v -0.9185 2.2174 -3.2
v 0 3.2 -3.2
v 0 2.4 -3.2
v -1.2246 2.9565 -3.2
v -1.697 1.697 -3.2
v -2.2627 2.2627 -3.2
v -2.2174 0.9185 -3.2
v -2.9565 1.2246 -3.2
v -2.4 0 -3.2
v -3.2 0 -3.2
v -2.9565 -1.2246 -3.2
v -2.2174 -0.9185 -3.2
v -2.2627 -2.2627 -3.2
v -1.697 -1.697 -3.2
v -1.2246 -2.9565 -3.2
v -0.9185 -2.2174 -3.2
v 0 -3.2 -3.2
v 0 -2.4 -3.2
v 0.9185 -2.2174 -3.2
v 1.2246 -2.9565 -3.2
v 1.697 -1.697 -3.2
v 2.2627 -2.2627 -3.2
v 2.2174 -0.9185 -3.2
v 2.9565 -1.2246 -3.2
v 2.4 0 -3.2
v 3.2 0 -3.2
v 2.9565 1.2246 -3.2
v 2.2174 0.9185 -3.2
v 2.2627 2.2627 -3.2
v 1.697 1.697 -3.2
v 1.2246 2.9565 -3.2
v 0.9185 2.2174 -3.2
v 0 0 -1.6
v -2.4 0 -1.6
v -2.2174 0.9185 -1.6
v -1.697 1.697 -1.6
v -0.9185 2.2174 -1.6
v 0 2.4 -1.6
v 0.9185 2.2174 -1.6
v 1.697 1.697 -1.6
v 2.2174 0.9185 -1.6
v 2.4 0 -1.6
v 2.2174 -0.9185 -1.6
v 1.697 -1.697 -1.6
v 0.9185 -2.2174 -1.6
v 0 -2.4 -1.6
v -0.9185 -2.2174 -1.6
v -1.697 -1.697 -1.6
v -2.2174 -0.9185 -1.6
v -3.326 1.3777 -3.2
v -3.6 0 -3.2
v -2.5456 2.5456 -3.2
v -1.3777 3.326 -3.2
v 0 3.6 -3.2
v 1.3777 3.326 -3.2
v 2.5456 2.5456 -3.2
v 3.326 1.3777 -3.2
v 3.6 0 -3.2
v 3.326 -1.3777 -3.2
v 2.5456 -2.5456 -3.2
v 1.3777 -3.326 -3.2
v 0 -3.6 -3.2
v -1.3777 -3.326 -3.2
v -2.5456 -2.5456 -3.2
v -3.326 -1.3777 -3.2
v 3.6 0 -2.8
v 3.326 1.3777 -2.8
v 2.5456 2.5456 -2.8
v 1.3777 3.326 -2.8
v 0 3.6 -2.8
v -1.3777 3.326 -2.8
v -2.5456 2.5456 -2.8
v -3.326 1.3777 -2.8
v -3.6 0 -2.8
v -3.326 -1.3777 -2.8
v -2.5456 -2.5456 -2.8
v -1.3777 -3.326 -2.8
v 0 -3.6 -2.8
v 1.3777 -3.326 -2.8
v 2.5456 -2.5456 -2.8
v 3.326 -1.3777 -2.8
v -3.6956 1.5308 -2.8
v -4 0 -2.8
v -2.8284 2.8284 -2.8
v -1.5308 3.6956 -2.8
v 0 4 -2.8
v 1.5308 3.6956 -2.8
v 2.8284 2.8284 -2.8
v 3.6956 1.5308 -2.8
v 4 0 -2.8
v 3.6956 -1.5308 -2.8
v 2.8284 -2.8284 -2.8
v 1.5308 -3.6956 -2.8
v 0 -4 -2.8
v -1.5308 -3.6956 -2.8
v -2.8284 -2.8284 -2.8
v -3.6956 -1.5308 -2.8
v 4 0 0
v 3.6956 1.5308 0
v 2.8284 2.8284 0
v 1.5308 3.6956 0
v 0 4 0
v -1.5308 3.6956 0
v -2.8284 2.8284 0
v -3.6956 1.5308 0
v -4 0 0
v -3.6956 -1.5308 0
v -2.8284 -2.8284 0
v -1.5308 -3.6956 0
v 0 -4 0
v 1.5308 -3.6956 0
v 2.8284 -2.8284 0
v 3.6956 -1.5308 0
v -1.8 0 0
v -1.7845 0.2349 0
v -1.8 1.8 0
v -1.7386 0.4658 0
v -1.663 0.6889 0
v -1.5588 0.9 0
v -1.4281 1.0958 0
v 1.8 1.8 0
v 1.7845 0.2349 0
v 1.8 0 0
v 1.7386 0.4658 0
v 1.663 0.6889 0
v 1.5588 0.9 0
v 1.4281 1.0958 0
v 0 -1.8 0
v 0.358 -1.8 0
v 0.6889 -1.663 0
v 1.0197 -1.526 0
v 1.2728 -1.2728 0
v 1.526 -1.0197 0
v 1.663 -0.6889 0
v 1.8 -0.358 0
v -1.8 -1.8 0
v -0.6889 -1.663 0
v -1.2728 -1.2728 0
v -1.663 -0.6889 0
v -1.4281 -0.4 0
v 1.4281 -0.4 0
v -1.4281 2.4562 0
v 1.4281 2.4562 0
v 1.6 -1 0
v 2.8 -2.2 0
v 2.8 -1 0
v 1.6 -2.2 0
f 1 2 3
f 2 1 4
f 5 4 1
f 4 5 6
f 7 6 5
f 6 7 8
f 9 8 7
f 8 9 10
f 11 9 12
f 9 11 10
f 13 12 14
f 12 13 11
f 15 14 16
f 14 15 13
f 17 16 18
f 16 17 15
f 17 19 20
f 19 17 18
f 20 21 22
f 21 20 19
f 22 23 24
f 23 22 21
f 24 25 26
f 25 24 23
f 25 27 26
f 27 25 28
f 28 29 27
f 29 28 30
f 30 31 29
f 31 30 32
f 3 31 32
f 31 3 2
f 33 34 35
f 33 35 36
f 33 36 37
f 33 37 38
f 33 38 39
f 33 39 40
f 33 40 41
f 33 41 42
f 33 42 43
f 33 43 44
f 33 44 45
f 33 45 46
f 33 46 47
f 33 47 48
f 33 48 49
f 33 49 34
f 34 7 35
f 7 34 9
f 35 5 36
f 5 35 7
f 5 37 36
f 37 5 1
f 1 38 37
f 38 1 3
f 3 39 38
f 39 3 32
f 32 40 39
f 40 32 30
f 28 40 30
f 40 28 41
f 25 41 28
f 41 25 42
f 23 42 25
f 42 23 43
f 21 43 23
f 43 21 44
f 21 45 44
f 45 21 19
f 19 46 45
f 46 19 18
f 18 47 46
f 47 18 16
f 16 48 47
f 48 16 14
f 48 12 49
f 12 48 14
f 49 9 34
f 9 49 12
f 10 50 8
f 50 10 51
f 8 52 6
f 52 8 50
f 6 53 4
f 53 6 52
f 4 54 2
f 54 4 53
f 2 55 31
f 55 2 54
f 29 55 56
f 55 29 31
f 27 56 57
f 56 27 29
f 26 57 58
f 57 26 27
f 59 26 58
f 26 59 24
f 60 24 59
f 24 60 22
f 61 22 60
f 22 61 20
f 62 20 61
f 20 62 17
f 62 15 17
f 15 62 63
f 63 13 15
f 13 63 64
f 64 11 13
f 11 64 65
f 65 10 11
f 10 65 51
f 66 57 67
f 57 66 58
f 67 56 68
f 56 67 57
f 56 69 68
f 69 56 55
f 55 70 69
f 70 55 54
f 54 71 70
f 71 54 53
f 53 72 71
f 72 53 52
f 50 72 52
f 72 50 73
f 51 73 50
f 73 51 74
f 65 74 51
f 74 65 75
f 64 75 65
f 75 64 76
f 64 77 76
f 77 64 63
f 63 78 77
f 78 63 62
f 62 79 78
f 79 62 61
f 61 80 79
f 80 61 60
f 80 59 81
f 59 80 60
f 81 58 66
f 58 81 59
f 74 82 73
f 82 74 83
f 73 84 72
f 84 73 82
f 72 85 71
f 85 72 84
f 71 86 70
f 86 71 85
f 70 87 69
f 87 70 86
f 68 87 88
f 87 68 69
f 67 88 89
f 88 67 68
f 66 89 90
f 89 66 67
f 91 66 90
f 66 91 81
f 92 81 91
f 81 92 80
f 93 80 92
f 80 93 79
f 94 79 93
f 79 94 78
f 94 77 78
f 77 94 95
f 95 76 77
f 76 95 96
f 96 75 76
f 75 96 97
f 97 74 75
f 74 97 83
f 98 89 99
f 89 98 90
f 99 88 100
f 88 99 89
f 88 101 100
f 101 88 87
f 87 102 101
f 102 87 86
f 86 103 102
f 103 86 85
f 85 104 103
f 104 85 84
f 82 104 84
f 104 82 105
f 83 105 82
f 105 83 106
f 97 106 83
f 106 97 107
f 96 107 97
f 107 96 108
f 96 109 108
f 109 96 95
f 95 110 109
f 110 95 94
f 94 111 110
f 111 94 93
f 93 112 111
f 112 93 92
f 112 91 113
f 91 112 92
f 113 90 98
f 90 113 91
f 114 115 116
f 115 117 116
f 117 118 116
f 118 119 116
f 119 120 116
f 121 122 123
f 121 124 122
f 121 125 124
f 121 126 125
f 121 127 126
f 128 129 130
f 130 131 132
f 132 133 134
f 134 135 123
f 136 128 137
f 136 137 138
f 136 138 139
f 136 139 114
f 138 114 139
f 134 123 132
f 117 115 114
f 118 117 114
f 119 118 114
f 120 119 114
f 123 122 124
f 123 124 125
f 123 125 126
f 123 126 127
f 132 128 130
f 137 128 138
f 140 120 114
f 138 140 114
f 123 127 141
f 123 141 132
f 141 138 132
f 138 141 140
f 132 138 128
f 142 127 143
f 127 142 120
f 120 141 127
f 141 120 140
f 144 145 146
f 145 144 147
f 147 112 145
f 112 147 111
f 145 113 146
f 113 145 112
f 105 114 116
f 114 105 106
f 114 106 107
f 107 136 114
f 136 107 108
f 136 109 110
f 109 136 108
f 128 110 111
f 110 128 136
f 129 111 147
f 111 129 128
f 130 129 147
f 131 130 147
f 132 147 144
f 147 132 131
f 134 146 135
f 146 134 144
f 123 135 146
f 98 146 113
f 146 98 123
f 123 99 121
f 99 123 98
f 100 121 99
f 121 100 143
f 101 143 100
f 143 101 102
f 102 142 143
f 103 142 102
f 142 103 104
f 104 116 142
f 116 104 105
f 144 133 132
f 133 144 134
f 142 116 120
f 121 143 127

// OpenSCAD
// file: ../p/4-4disc.scad
use <../lib.scad>
function ldraw_lib__4_4disc() = [
// 0 Disc 1.0
// 0 Name: 4-4disc.dat
// 0 Author: James Jessiman
// 0 !LDRAW_ORG Primitive UPDATE 2002-02
// 0 !LICENSE Licensed under CC BY 2.0 and CC BY 4.0 : see CAreadme.txt
// 
// 0 BFC CERTIFY CCW
  [0,"BFC","CERTIFY"],
  [0,"BFC","CCW"],
// 
// 0 !HISTORY 1998-12-15 [PTadmin] Official Update 1998-10
// 0 !HISTORY 2002-03-23 [sbliss] Added BFC statement
// 0 !HISTORY 2002-04-25 [PTadmin] Official Update 2002-02
// 0 !HISTORY 2007-06-24 [PTadmin] Header formatted for Contributor Agreement
// 0 !HISTORY 2008-07-01 [PTadmin] Official Update 2008-01
// 
// 
// 3 16 0 0 0 1 0 0 0.9239 0 0.3827
  [3,16,0,0,0,1,0,0,0.9239,0,0.3827],
// 3 16 0 0 0 0.9239 0 0.3827 0.7071 0 0.7071
  [3,16,0,0,0,0.9239,0,0.3827,0.7071,0,0.7071],
// 3 16 0 0 0 0.7071 0 0.7071 0.3827 0 0.9239
  [3,16,0,0,0,0.7071,0,0.7071,0.3827,0,0.9239],
// 3 16 0 0 0 0.3827 0 0.9239 0 0 1
  [3,16,0,0,0,0.3827,0,0.9239,0,0,1],
// 3 16 0 0 0 0 0 1 -0.3827 0 0.9239
  [3,16,0,0,0,0,0,1,-0.3827,0,0.9239],
// 3 16 0 0 0 -0.3827 0 0.9239 -0.7071 0 0.7071
  [3,16,0,0,0,-0.3827,0,0.9239,-0.7071,0,0.7071],
// 3 16 0 0 0 -0.7071 0 0.7071 -0.9239 0 0.3827
  [3,16,0,0,0,-0.7071,0,0.7071,-0.9239,0,0.3827],
// 3 16 0 0 0 -0.9239 0 0.3827 -1 0 -0
  [3,16,0,0,0,-0.9239,0,0.3827,-1,0,-0],
// 3 16 0 0 0 -1 0 -0 -0.9239 0 -0.3827
  [3,16,0,0,0,-1,0,-0,-0.9239,0,-0.3827],
// 3 16 0 0 0 -0.9239 0 -0.3827 -0.7071 0 -0.7071
  [3,16,0,0,0,-0.9239,0,-0.3827,-0.7071,0,-0.7071],
// 3 16 0 0 0 -0.7071 0 -0.7071 -0.3827 0 -0.9239
  [3,16,0,0,0,-0.7071,0,-0.7071,-0.3827,0,-0.9239],
// 3 16 0 0 0 -0.3827 0 -0.9239 0 0 -1
  [3,16,0,0,0,-0.3827,0,-0.9239,0,0,-1],
// 3 16 0 0 0 0 0 -1 0.3827 0 -0.9239
  [3,16,0,0,0,0,0,-1,0.3827,0,-0.9239],
// 3 16 0 0 0 0.3827 0 -0.9239 0.7071 0 -0.7071
  [3,16,0,0,0,0.3827,0,-0.9239,0.7071,0,-0.7071],
// 3 16 0 0 0 0.7071 0 -0.7071 0.9239 0 -0.3827
  [3,16,0,0,0,0.7071,0,-0.7071,0.9239,0,-0.3827],
// 3 16 0 0 0 0.9239 0 -0.3827 1 0 0
  [3,16,0,0,0,0.9239,0,-0.3827,1,0,0],
// 0
];
module ldraw_lib__4_4disc(step=0, col=false, unit=2/5, alt=false, line=0.2, solid=!$preview)
    makepoly(ldraw_lib__4_4disc(), step=step, col=col, unit=unit, alt=alt, line=line, solid=solid);
ldraw_lib__4_4disc(line=0.2);
// file: ../p/4-4ring3.scad
use <../lib.scad>
$fa=1; $fs=0.2;
function ldraw_lib__4_4ring3(realsolid=false) = [
// 0 Ring  3 x 1.0
// 0 Name: 4-4ring3.dat
// 0 Author: James Jessiman
// 0 !LDRAW_ORG Primitive UPDATE 2009-01
// 0 !LICENSE Licensed under CC BY 2.0 and CC BY 4.0 : see CAreadme.txt
// 
// 0 BFC CERTIFY CCW
  [0,"BFC","CERTIFY"],
  [0,"BFC","CCW"],
// 
// 0 !HISTORY 1998-12-15 [PTadmin] Official Update 1998-10
// 0 !HISTORY 2002-04-05 [hafhead] Added BFC statement
// 0 !HISTORY 2002-04-25 [PTadmin] Official Update 2002-02
// 0 !HISTORY 2007-06-24 [PTadmin] Header formatted for Contributor Agreement
// 0 !HISTORY 2008-07-01 [PTadmin] Official Update 2008-01
// 0 !HISTORY 2008-08-26 [cwdee] Switch polygon winding and rename
// 0 !HISTORY 2009-05-02 [PTadmin] Official Update 2009-01
// 
// 
// 4 16 -1.5308 0 3.6956 -1.1481 0 2.7717 0 0 3 0 0 4
  [4,16,-1.5308,0,3.6956,-1.1481,0,2.7717,0,0,3,0,0,4],
// 4 16 -2.8284 0 2.8284 -2.1213 0 2.1213 -1.1481 0 2.7717 -1.5308 0 3.6956
  [4,16,-2.8284,0,2.8284,-2.1213,0,2.1213,-1.1481,0,2.7717,-1.5308,0,3.6956],
// 4 16 -3.6956 0 1.5308 -2.7717 0 1.1481 -2.1213 0 2.1213 -2.8284 0 2.8284
  [4,16,-3.6956,0,1.5308,-2.7717,0,1.1481,-2.1213,0,2.1213,-2.8284,0,2.8284],
// 4 16 -4 0 0 -3 0 0 -2.7717 0 1.1481 -3.6956 0 1.5308
  [4,16,-4,0,0,-3,0,0,-2.7717,0,1.1481,-3.6956,0,1.5308],
// 4 16 -3.6956 0 -1.5308 -2.7717 0 -1.1481 -3 0 0 -4 0 0
  [4,16,-3.6956,0,-1.5308,-2.7717,0,-1.1481,-3,0,0,-4,0,0],
// 4 16 -2.8284 0 -2.8284 -2.1213 0 -2.1213 -2.7717 0 -1.1481 -3.6956 0 -1.5308
  [4,16,-2.8284,0,-2.8284,-2.1213,0,-2.1213,-2.7717,0,-1.1481,-3.6956,0,-1.5308],
// 4 16 -1.5308 0 -3.6956 -1.1481 0 -2.7717 -2.1213 0 -2.1213 -2.8284 0 -2.8284
  [4,16,-1.5308,0,-3.6956,-1.1481,0,-2.7717,-2.1213,0,-2.1213,-2.8284,0,-2.8284],
// 4 16 0 0 -4 0 0 -3 -1.1481 0 -2.7717 -1.5308 0 -3.6956
  [4,16,0,0,-4,0,0,-3,-1.1481,0,-2.7717,-1.5308,0,-3.6956],
// 4 16 1.5308 0 -3.6956 1.1481 0 -2.7717 0 0 -3 0 0 -4
  [4,16,1.5308,0,-3.6956,1.1481,0,-2.7717,0,0,-3,0,0,-4],
// 4 16 2.8284 0 -2.8284 2.1213 0 -2.1213 1.1481 0 -2.7717 1.5308 0 -3.6956
  [4,16,2.8284,0,-2.8284,2.1213,0,-2.1213,1.1481,0,-2.7717,1.5308,0,-3.6956],
// 4 16 3.6956 0 -1.5308 2.7717 0 -1.1481 2.1213 0 -2.1213 2.8284 0 -2.8284
  [4,16,3.6956,0,-1.5308,2.7717,0,-1.1481,2.1213,0,-2.1213,2.8284,0,-2.8284],
// 4 16 4 0 0 3 0 0 2.7717 0 -1.1481 3.6956 0 -1.5308
  [4,16,4,0,0,3,0,0,2.7717,0,-1.1481,3.6956,0,-1.5308],
// 4 16 3.6956 0 1.5308 2.7717 0 1.1481 3 0 0 4 0 0
  [4,16,3.6956,0,1.5308,2.7717,0,1.1481,3,0,0,4,0,0],
// 4 16 2.8284 0 2.8284 2.1213 0 2.1213 2.7717 0 1.1481 3.6956 0 1.5308
  [4,16,2.8284,0,2.8284,2.1213,0,2.1213,2.7717,0,1.1481,3.6956,0,1.5308],
// 4 16 1.5308 0 3.6956 1.1481 0 2.7717 2.1213 0 2.1213 2.8284 0 2.8284
  [4,16,1.5308,0,3.6956,1.1481,0,2.7717,2.1213,0,2.1213,2.8284,0,2.8284],
// 4 16 0 0 4 0 0 3 1.1481 0 2.7717 1.5308 0 3.6956
  [4,16,0,0,4,0,0,3,1.1481,0,2.7717,1.5308,0,3.6956],
// 0
];
module ldraw_lib__4_4ring3(step=0, col=false, unit=2/5, alt=false, line=0.2, solid=!$preview)
    makepoly(ldraw_lib__4_4ring3(solid), step=step, col=col, unit=unit, alt=alt, line=line, solid=solid);
ldraw_lib__4_4ring3(line=0.2);
// file: ../p/4-4cylc.scad
use <../lib.scad>
use <4-4cyli.scad>
use <4-4disc.scad>
use <4-4edge.scad>
function ldraw_lib__4_4cylc() = [
// 0 Cylinder Closed 1.0
// 0 Name: 4-4cylc.dat
// 0 Author: Alex Taylor [anathema]
// 0 !LDRAW_ORG Primitive UPDATE 2009-02
// 0 !LICENSE Licensed under CC BY 4.0 : see CAreadme.txt
// 
// 0 BFC CERTIFY CCW
  [0,"BFC","CERTIFY"],
  [0,"BFC","CCW"],
// 
// 0 !HISTORY 2008-12-29 [cwdee] Removed one disc
// 0 !HISTORY 2009-09-03 [PTadmin] Official Update 2009-02
// 
// 
// 1 16 0 0 0 1 0 0 0 1 0 0 0 1 4-4edge.dat
  [1,16,0,0,0,1,0,0,0,1,0,0,0,1, ldraw_lib__4_4edge()],
// 1 16 0 1 0 1 0 0 0 1 0 0 0 1 4-4edge.dat
  [1,16,0,1,0,1,0,0,0,1,0,0,0,1, ldraw_lib__4_4edge()],
// 1 16 0 0 0 1 0 0 0 1 0 0 0 1 4-4disc.dat
  [1,16,0,0,0,1,0,0,0,1,0,0,0,1, ldraw_lib__4_4disc()],
// 1 16 0 0 0 1 0 0 0 1 0 0 0 1 4-4cyli.dat
  [1,16,0,0,0,1,0,0,0,1,0,0,0,1, ldraw_lib__4_4cyli()],
// 0
];
module ldraw_lib__4_4cylc(step=0, col=false, unit=2/5, alt=false, line=0.2, solid=!$preview)
    makepoly(ldraw_lib__4_4cylc(), step=step, col=col, unit=unit, alt=alt, line=line, solid=solid);
ldraw_lib__4_4cylc(line=0.2);
// file: ../p/4-4edge.scad
use <../lib.scad>
function ldraw_lib__4_4edge() = [
// 0 Circle 1.0
// 0 Name: 4-4edge.dat
// 0 Author: James Jessiman
// 0 !LDRAW_ORG Primitive UPDATE 2017-01
// 0 !LICENSE Licensed under CC BY 2.0 and CC BY 4.0 : see CAreadme.txt
// 
// 0 BFC CERTIFY CCW
  [0,"BFC","CERTIFY"],
  [0,"BFC","CCW"],
// 
// 0 !HISTORY 1998-12-15 [PTadmin] Official Update 1998-10
// 0 !HISTORY 2005-12-28 [PTadmin] Official Update 2005-01
// 0 !HISTORY 2007-06-24 [PTadmin] Header formatted for Contributor Agreement
// 0 !HISTORY 2008-07-01 [PTadmin] Official Update 2008-01
// 0 !HISTORY 2017-01-15 [Steffen] BFCed
// 0 !HISTORY 2017-12-30 [PTadmin] Official Update 2017-01
// 
// 
// 2 24 1 0 0 0.9239 0 0.3827
  [2,24,1,0,0,0.9239,0,0.3827],
// 2 24 0.9239 0 0.3827 0.7071 0 0.7071
  [2,24,0.9239,0,0.3827,0.7071,0,0.7071],
// 2 24 0.7071 0 0.7071 0.3827 0 0.9239
  [2,24,0.7071,0,0.7071,0.3827,0,0.9239],
// 2 24 0.3827 0 0.9239 0 0 1
  [2,24,0.3827,0,0.9239,0,0,1],
// 2 24 0 0 1 -0.3827 0 0.9239
  [2,24,0,0,1,-0.3827,0,0.9239],
// 2 24 -0.3827 0 0.9239 -0.7071 0 0.7071
  [2,24,-0.3827,0,0.9239,-0.7071,0,0.7071],
// 2 24 -0.7071 0 0.7071 -0.9239 0 0.3827
  [2,24,-0.7071,0,0.7071,-0.9239,0,0.3827],
// 2 24 -0.9239 0 0.3827 -1 0 -0
  [2,24,-0.9239,0,0.3827,-1,0,-0],
// 2 24 -1 0 -0 -0.9239 0 -0.3827
  [2,24,-1,0,-0,-0.9239,0,-0.3827],
// 2 24 -0.9239 0 -0.3827 -0.7071 0 -0.7071
  [2,24,-0.9239,0,-0.3827,-0.7071,0,-0.7071],
// 2 24 -0.7071 0 -0.7071 -0.3827 0 -0.9239
  [2,24,-0.7071,0,-0.7071,-0.3827,0,-0.9239],
// 2 24 -0.3827 0 -0.9239 0 0 -1
  [2,24,-0.3827,0,-0.9239,0,0,-1],
// 2 24 0 0 -1 0.3827 0 -0.9239
  [2,24,0,0,-1,0.3827,0,-0.9239],
// 2 24 0.3827 0 -0.9239 0.7071 0 -0.7071
  [2,24,0.3827,0,-0.9239,0.7071,0,-0.7071],
// 2 24 0.7071 0 -0.7071 0.9239 0 -0.3827
  [2,24,0.7071,0,-0.7071,0.9239,0,-0.3827],
// 2 24 0.9239 0 -0.3827 1 0 0
  [2,24,0.9239,0,-0.3827,1,0,0],
];
module ldraw_lib__4_4edge(step=0, col=false, unit=2/5, alt=false, line=0.2, solid=!$preview)
    makepoly(ldraw_lib__4_4edge(), step=step, col=col, unit=unit, alt=alt, line=line, solid=solid);
ldraw_lib__4_4edge(line=0.2);
// file: ../p/4-4cyli.scad
use <../lib.scad>
$fa=1; $fs=0.2;
function ldraw_lib__4_4cyli(realsolid=false) = [
// 0 Cylinder 1.0
// 0 Name: 4-4cyli.dat
// 0 Author: James Jessiman
// 0 !LDRAW_ORG Primitive UPDATE 2005-01
// 0 !LICENSE Licensed under CC BY 2.0 and CC BY 4.0 : see CAreadme.txt
// 
// 0 BFC CERTIFY CCW
  [0,"BFC","CERTIFY"],
  [0,"BFC","CCW"],
// 
// 0 !HISTORY 1998-12-15 [PTadmin] Official Update 1998-10
// 0 !HISTORY 2002-03-23 [sbliss] Added BFC statement; merged headers from files in distributions LDraw 0.27 and Complete.
// 0 !HISTORY 2002-04-25 [PTadmin] Official Update 2002-02
// 0 !HISTORY 2004-12-14 [guyvivan] BFC CCW
// 0 !HISTORY 2005-12-28 [PTadmin] Official Update 2005-01
// 0 !HISTORY 2007-06-24 [PTadmin] Header formatted for Contributor Agreement
// 0 !HISTORY 2008-07-01 [PTadmin] Official Update 2008-01
// 
// 
// 4 16 1 1 0 0.9239 1 0.3827 0.9239 0 0.3827 1 0 0
  [4,16,1,1,0,0.9239,1,0.3827,0.9239,0,0.3827,1,0,0],
// 5 24 1 0 0 1 1 0 0.9239 0 0.3827 0.9239 0 -0.3827
  [5,24,1,0,0,1,1,0,0.9239,0,0.3827,0.9239,0,-0.3827],
// 4 16 0.9239 1 0.3827 0.7071 1 0.7071 0.7071 0 0.7071 0.9239 0 0.3827
  [4,16,0.9239,1,0.3827,0.7071,1,0.7071,0.7071,0,0.7071,0.9239,0,0.3827],
// 5 24 0.9239 0 0.3827 0.9239 1 0.3827 0.7071 0 0.7071 1 0 0
  [5,24,0.9239,0,0.3827,0.9239,1,0.3827,0.7071,0,0.7071,1,0,0],
// 4 16 0.7071 1 0.7071 0.3827 1 0.9239 0.3827 0 0.9239 0.7071 0 0.7071
  [4,16,0.7071,1,0.7071,0.3827,1,0.9239,0.3827,0,0.9239,0.7071,0,0.7071],
// 5 24 0.7071 0 0.7071 0.7071 1 0.7071 0.3827 0 0.9239 0.9239 0 0.3827
  [5,24,0.7071,0,0.7071,0.7071,1,0.7071,0.3827,0,0.9239,0.9239,0,0.3827],
// 4 16 0.3827 1 0.9239 0 1 1 0 0 1 0.3827 0 0.9239
  [4,16,0.3827,1,0.9239,0,1,1,0,0,1,0.3827,0,0.9239],
// 5 24 0.3827 0 0.9239 0.3827 1 0.9239 0 0 1 0.7071 0 0.7071
  [5,24,0.3827,0,0.9239,0.3827,1,0.9239,0,0,1,0.7071,0,0.7071],
// 4 16 0 1 1 -0.3827 1 0.9239 -0.3827 0 0.9239 0 0 1
  [4,16,0,1,1,-0.3827,1,0.9239,-0.3827,0,0.9239,0,0,1],
// 5 24 0 0 1 0 1 1 -0.3827 0 0.9239 0.3827 0 0.9239
  [5,24,0,0,1,0,1,1,-0.3827,0,0.9239,0.3827,0,0.9239],
// 4 16 -0.3827 1 0.9239 -0.7071 1 0.7071 -0.7071 0 0.7071 -0.3827 0 0.9239
  [4,16,-0.3827,1,0.9239,-0.7071,1,0.7071,-0.7071,0,0.7071,-0.3827,0,0.9239],
// 5 24 -0.3827 0 0.9239 -0.3827 1 0.9239 -0.7071 0 0.7071 0 0 1
  [5,24,-0.3827,0,0.9239,-0.3827,1,0.9239,-0.7071,0,0.7071,0,0,1],
// 4 16 -0.7071 1 0.7071 -0.9239 1 0.3827 -0.9239 0 0.3827 -0.7071 0 0.7071
  [4,16,-0.7071,1,0.7071,-0.9239,1,0.3827,-0.9239,0,0.3827,-0.7071,0,0.7071],
// 5 24 -0.7071 0 0.7071 -0.7071 1 0.7071 -0.9239 0 0.3827 -0.3827 0 0.9239
  [5,24,-0.7071,0,0.7071,-0.7071,1,0.7071,-0.9239,0,0.3827,-0.3827,0,0.9239],
// 4 16 -0.9239 1 0.3827 -1 1 0 -1 0 0 -0.9239 0 0.3827
  [4,16,-0.9239,1,0.3827,-1,1,0,-1,0,0,-0.9239,0,0.3827],
// 5 24 -0.9239 0 0.3827 -0.9239 1 0.3827 -1 0 0 -0.7071 0 0.7071
  [5,24,-0.9239,0,0.3827,-0.9239,1,0.3827,-1,0,0,-0.7071,0,0.7071],
// 4 16 -1 1 0 -0.9239 1 -0.3827 -0.9239 0 -0.3827 -1 0 0
  [4,16,-1,1,0,-0.9239,1,-0.3827,-0.9239,0,-0.3827,-1,0,0],
// 5 24 -1 0 0 -1 1 0 -0.9239 0 -0.3827 -0.9239 0 0.3827
  [5,24,-1,0,0,-1,1,0,-0.9239,0,-0.3827,-0.9239,0,0.3827],
// 4 16 -0.9239 1 -0.3827 -0.7071 1 -0.7071 -0.7071 0 -0.7071 -0.9239 0 -0.3827
  [4,16,-0.9239,1,-0.3827,-0.7071,1,-0.7071,-0.7071,0,-0.7071,-0.9239,0,-0.3827],
// 5 24 -0.9239 0 -0.3827 -0.9239 1 -0.3827 -0.7071 0 -0.7071 -1 0 0
  [5,24,-0.9239,0,-0.3827,-0.9239,1,-0.3827,-0.7071,0,-0.7071,-1,0,0],
// 4 16 -0.7071 1 -0.7071 -0.3827 1 -0.9239 -0.3827 0 -0.9239 -0.7071 0 -0.7071
  [4,16,-0.7071,1,-0.7071,-0.3827,1,-0.9239,-0.3827,0,-0.9239,-0.7071,0,-0.7071],
// 5 24 -0.7071 0 -0.7071 -0.7071 1 -0.7071 -0.3827 0 -0.9239 -0.9239 0 -0.3827
  [5,24,-0.7071,0,-0.7071,-0.7071,1,-0.7071,-0.3827,0,-0.9239,-0.9239,0,-0.3827],
// 4 16 -0.3827 1 -0.9239 0 1 -1 0 0 -1 -0.3827 0 -0.9239
  [4,16,-0.3827,1,-0.9239,0,1,-1,0,0,-1,-0.3827,0,-0.9239],
// 5 24 -0.3827 0 -0.9239 -0.3827 1 -0.9239 0 0 -1 -0.7071 0 -0.7071
  [5,24,-0.3827,0,-0.9239,-0.3827,1,-0.9239,0,0,-1,-0.7071,0,-0.7071],
// 4 16 0 1 -1 0.3827 1 -0.9239 0.3827 0 -0.9239 0 0 -1
  [4,16,0,1,-1,0.3827,1,-0.9239,0.3827,0,-0.9239,0,0,-1],
// 5 24 0 0 -1 0 1 -1 0.3827 0 -0.9239 -0.3827 0 -0.9239
  [5,24,0,0,-1,0,1,-1,0.3827,0,-0.9239,-0.3827,0,-0.9239],
// 4 16 0.3827 1 -0.9239 0.7071 1 -0.7071 0.7071 0 -0.7071 0.3827 0 -0.9239
  [4,16,0.3827,1,-0.9239,0.7071,1,-0.7071,0.7071,0,-0.7071,0.3827,0,-0.9239],
// 5 24 0.3827 0 -0.9239 0.3827 1 -0.9239 0.7071 0 -0.7071 0 0 -1
  [5,24,0.3827,0,-0.9239,0.3827,1,-0.9239,0.7071,0,-0.7071,0,0,-1],
// 4 16 0.7071 1 -0.7071 0.9239 1 -0.3827 0.9239 0 -0.3827 0.7071 0 -0.7071
  [4,16,0.7071,1,-0.7071,0.9239,1,-0.3827,0.9239,0,-0.3827,0.7071,0,-0.7071],
// 5 24 0.7071 0 -0.7071 0.7071 1 -0.7071 0.9239 0 -0.3827 0.3827 0 -0.9239
  [5,24,0.7071,0,-0.7071,0.7071,1,-0.7071,0.9239,0,-0.3827,0.3827,0,-0.9239],
// 4 16 0.9239 1 -0.3827 1 1 0 1 0 0 0.9239 0 -0.3827
  [4,16,0.9239,1,-0.3827,1,1,0,1,0,0,0.9239,0,-0.3827],
// 5 24 0.9239 0 -0.3827 0.9239 1 -0.3827 1 0 0 0.7071 0 -0.7071
  [5,24,0.9239,0,-0.3827,0.9239,1,-0.3827,1,0,0,0.7071,0,-0.7071],
// 0
];
module ldraw_lib__4_4cyli(step=0, col=false, unit=2/5, alt=false, line=0.2, solid=!$preview)
    makepoly(ldraw_lib__4_4cyli(solid), step=step, col=col, unit=unit, alt=alt, line=line, solid=solid);
ldraw_lib__4_4cyli(line=0.2);
// file: ../p/empty.scad
use <../lib.scad>
function ldraw_lib__empty() = [
// 0 Empty
// 0 Name: empty.dat
// 0 Author: Steffen [Steffen]
// 0 !LDRAW_ORG Primitive UPDATE 2015-01
// 0 !LICENSE Licensed under CC BY 4.0 : see CAreadme.txt
// 
// 0 BFC CERTIFY CCW
  [0,"BFC","CERTIFY"],
  [0,"BFC","CCW"],
// 
// 0 !HISTORY 2015-10-11 [PTadmin] Official Update 2015-01
// 
// 
// 0 // // Tool MLCad cannot handle really empty files. This file is used as a workaround.
// 0 // // It exceptionally contains forbidden non-LDRAW standard syntax to satisfy MLCad until it is fixed OR a different editor has become the de-facto LDRAW standard.
// 0 // // The line being used here is an "impossible" conditional line which never should be visible,
// 0 // // additionally hidden by a syntax explicitly hiding it from displaying.
// 
// 0 // MLCAD HIDE 5 24 0 0 0 0.0001 0 0 0.0001 -0.0001 0 0 0 0
];
module ldraw_lib__empty(step=0, col=false, unit=2/5, alt=false, line=0.2, solid=!$preview)
    makepoly(ldraw_lib__empty(), step=step, col=col, unit=unit, alt=alt, line=line, solid=solid);
ldraw_lib__empty(line=0.2);
// file: ../p/stud4o.scad
use <../lib.scad>
use <4-4cylc.scad>
use <4-4ring3.scad>
function ldraw_lib__stud4o() = [
// 0 Stud Tube Open without Outer Cylinder
// 0 Name: stud4o.dat
// 0 Author: Magnus Forsberg [MagFors]
// 0 !LDRAW_ORG Primitive UPDATE 2011-02
// 0 !LICENSE Licensed under CC BY 4.0 : see CAreadme.txt
// 
// 0 !HELP This stud is a "antistud" to be used like a underside stud,
// 0 !HELP but without the outer cylinder.
// 0 !HELP 1 47 0 0 0 1 0 0 0 1 0 0 0 1 stud4.dat
// 
// 0 BFC CERTIFY CCW
  [0,"BFC","CERTIFY"],
  [0,"BFC","CCW"],
// 
// 0 !HISTORY 2011-12-29 [PTadmin] Official Update 2011-02
// 
// 
// 1 16 0 -4 0 2 0 0 0 1 0 0 0 2 4-4ring3.dat
  [1,16,0,-4,0,2,0,0,0,1,0,0,0,2, ldraw_lib__4_4ring3()],
// 0 BFC INVERTNEXT
  [0,"BFC","INVERTNEXT"],
// 1 16 0 0 0 -6 0 0 0 -4 0 0 0 6 4-4cylc.dat
  [1,16,0,0,0,-6,0,0,0,-4,0,0,0,6, ldraw_lib__4_4cylc()],
];
module ldraw_lib__stud4o(step=0, col=false, unit=2/5, alt=false, line=0.2, solid=!$preview)
    makepoly(ldraw_lib__stud4o(), step=step, col=col, unit=unit, alt=alt, line=line, solid=solid);
ldraw_lib__stud4o(line=0.2);
// file: ../p/4-4ring9.scad
use <../lib.scad>
function ldraw_lib__4_4ring9() = [
// 0 Ring  9 x 1.0
// 0 Name: 4-4ring9.dat
// 0 Author: John Riley [jriley]
// 0 !LDRAW_ORG Primitive UPDATE 2004-02
// 0 !LICENSE Licensed under CC BY 2.0 and CC BY 4.0 : see CAreadme.txt
// 
// 0 BFC CERTIFY CCW
  [0,"BFC","CERTIFY"],
  [0,"BFC","CCW"],
// 
// 0 !HISTORY 2004-04-22 [PTadmin] Official Update 2004-02
// 0 !HISTORY 2007-06-24 [PTadmin] Header formatted for Contributor Agreement
// 0 !HISTORY 2008-07-01 [PTadmin] Official Update 2008-01
// 
// 
// 4 16 9 0 0 10 0 0 9.239 0 3.827 8.3151 0 3.4443
  [4,16,9,0,0,10,0,0,9.239,0,3.827,8.3151,0,3.4443],
// 4 16 8.3151 0 3.4443 9.239 0 3.827 7.071 0 7.071 6.3639 0 6.3639
  [4,16,8.3151,0,3.4443,9.239,0,3.827,7.071,0,7.071,6.3639,0,6.3639],
// 4 16 6.3639 0 6.3639 7.071 0 7.071 3.827 0 9.239 3.4443 0 8.3151
  [4,16,6.3639,0,6.3639,7.071,0,7.071,3.827,0,9.239,3.4443,0,8.3151],
// 4 16 3.4443 0 8.3151 3.827 0 9.239 0 0 10 0 0 9
  [4,16,3.4443,0,8.3151,3.827,0,9.239,0,0,10,0,0,9],
// 4 16 0 0 9 0 0 10 -3.827 0 9.239 -3.4443 0 8.3151
  [4,16,0,0,9,0,0,10,-3.827,0,9.239,-3.4443,0,8.3151],
// 4 16 -3.4443 0 8.3151 -3.827 0 9.239 -7.071 0 7.071 -6.3639 0 6.3639
  [4,16,-3.4443,0,8.3151,-3.827,0,9.239,-7.071,0,7.071,-6.3639,0,6.3639],
// 4 16 -6.3639 0 6.3639 -7.071 0 7.071 -9.239 0 3.827 -8.3151 0 3.4443
  [4,16,-6.3639,0,6.3639,-7.071,0,7.071,-9.239,0,3.827,-8.3151,0,3.4443],
// 4 16 -8.3151 0 3.4443 -9.239 0 3.827 -10 0 0 -9 0 0
  [4,16,-8.3151,0,3.4443,-9.239,0,3.827,-10,0,0,-9,0,0],
// 4 16 -9 0 0 -10 0 0 -9.239 0 -3.827 -8.3151 0 -3.4443
  [4,16,-9,0,0,-10,0,0,-9.239,0,-3.827,-8.3151,0,-3.4443],
// 4 16 -8.3151 0 -3.4443 -9.239 0 -3.827 -7.071 0 -7.071 -6.3639 0 -6.3639
  [4,16,-8.3151,0,-3.4443,-9.239,0,-3.827,-7.071,0,-7.071,-6.3639,0,-6.3639],
// 4 16 -6.3639 0 -6.3639 -7.071 0 -7.071 -3.827 0 -9.239 -3.4443 0 -8.3151
  [4,16,-6.3639,0,-6.3639,-7.071,0,-7.071,-3.827,0,-9.239,-3.4443,0,-8.3151],
// 4 16 -3.4443 0 -8.3151 -3.827 0 -9.239 0 0 -10 0 0 -9
  [4,16,-3.4443,0,-8.3151,-3.827,0,-9.239,0,0,-10,0,0,-9],
// 4 16 0 0 -9 0 0 -10 3.827 0 -9.239 3.4443 0 -8.3151
  [4,16,0,0,-9,0,0,-10,3.827,0,-9.239,3.4443,0,-8.3151],
// 4 16 3.4443 0 -8.3151 3.827 0 -9.239 7.071 0 -7.071 6.3639 0 -6.3639
  [4,16,3.4443,0,-8.3151,3.827,0,-9.239,7.071,0,-7.071,6.3639,0,-6.3639],
// 4 16 6.3639 0 -6.3639 7.071 0 -7.071 9.239 0 -3.827 8.3151 0 -3.4443
  [4,16,6.3639,0,-6.3639,7.071,0,-7.071,9.239,0,-3.827,8.3151,0,-3.4443],
// 4 16 8.3151 0 -3.4443 9.239 0 -3.827 10 0 0 9 0 0
  [4,16,8.3151,0,-3.4443,9.239,0,-3.827,10,0,0,9,0,0],
// 0
];
makepoly(ldraw_lib__4_4ring9(), line=0.2);
// file: ../p/4-4ring8.scad
use <../lib.scad>
function ldraw_lib__4_4ring8() = [
// 0 Ring  8 x 1.0
// 0 Name: 4-4ring8.dat
// 0 Author: Steffen [Steffen]
// 0 !LDRAW_ORG Primitive UPDATE 2012-01
// 0 !LICENSE Licensed under CC BY 4.0 : see CAreadme.txt
// 
// 0 BFC CERTIFY CCW
  [0,"BFC","CERTIFY"],
  [0,"BFC","CCW"],
// 
// 0 !HISTORY 2003-12-19 [PTadmin] Official Update 2003-03
// 0 !HISTORY 2007-06-24 [PTadmin] Header formatted for Contributor Agreement
// 0 !HISTORY 2008-07-01 [PTadmin] Official Update 2008-01
// 0 !HISTORY 2012-02-16 [Philo] Changed to CCW
// 0 !HISTORY 2012-03-30 [PTadmin] Official Update 2012-01
// 
// 
// 4 16 9 0 0 8.3151 0 3.4443 7.3912 0 3.0616 8 0 0
  [4,16,9,0,0,8.3151,0,3.4443,7.3912,0,3.0616,8,0,0],
// 4 16 8.3151 0 3.4443 6.3639 0 6.3639 5.6568 0 5.6568 7.3912 0 3.0616
  [4,16,8.3151,0,3.4443,6.3639,0,6.3639,5.6568,0,5.6568,7.3912,0,3.0616],
// 4 16 6.3639 0 6.3639 3.4443 0 8.3151 3.0616 0 7.3912 5.6568 0 5.6568
  [4,16,6.3639,0,6.3639,3.4443,0,8.3151,3.0616,0,7.3912,5.6568,0,5.6568],
// 4 16 3.4443 0 8.3151 0 0 9 0 0 8 3.0616 0 7.3912
  [4,16,3.4443,0,8.3151,0,0,9,0,0,8,3.0616,0,7.3912],
// 4 16 0 0 9 -3.4443 0 8.3151 -3.0616 0 7.3912 0 0 8
  [4,16,0,0,9,-3.4443,0,8.3151,-3.0616,0,7.3912,0,0,8],
// 4 16 -3.4443 0 8.3151 -6.3639 0 6.3639 -5.6568 0 5.6568 -3.0616 0 7.3912
  [4,16,-3.4443,0,8.3151,-6.3639,0,6.3639,-5.6568,0,5.6568,-3.0616,0,7.3912],
// 4 16 -6.3639 0 6.3639 -8.3151 0 3.4443 -7.3912 0 3.0616 -5.6568 0 5.6568
  [4,16,-6.3639,0,6.3639,-8.3151,0,3.4443,-7.3912,0,3.0616,-5.6568,0,5.6568],
// 4 16 -8.3151 0 3.4443 -9 0 0 -8 0 0 -7.3912 0 3.0616
  [4,16,-8.3151,0,3.4443,-9,0,0,-8,0,0,-7.3912,0,3.0616],
// 4 16 -9 0 0 -8.3151 0 -3.4443 -7.3912 0 -3.0616 -8 0 0
  [4,16,-9,0,0,-8.3151,0,-3.4443,-7.3912,0,-3.0616,-8,0,0],
// 4 16 -8.3151 0 -3.4443 -6.3639 0 -6.3639 -5.6568 0 -5.6568 -7.3912 0 -3.0616
  [4,16,-8.3151,0,-3.4443,-6.3639,0,-6.3639,-5.6568,0,-5.6568,-7.3912,0,-3.0616],
// 4 16 -6.3639 0 -6.3639 -3.4443 0 -8.3151 -3.0616 0 -7.3912 -5.6568 0 -5.6568
  [4,16,-6.3639,0,-6.3639,-3.4443,0,-8.3151,-3.0616,0,-7.3912,-5.6568,0,-5.6568],
// 4 16 -3.4443 0 -8.3151 0 0 -9 0 0 -8 -3.0616 0 -7.3912
  [4,16,-3.4443,0,-8.3151,0,0,-9,0,0,-8,-3.0616,0,-7.3912],
// 4 16 0 0 -9 3.4443 0 -8.3151 3.0616 0 -7.3912 0 0 -8
  [4,16,0,0,-9,3.4443,0,-8.3151,3.0616,0,-7.3912,0,0,-8],
// 4 16 3.4443 0 -8.3151 6.3639 0 -6.3639 5.6568 0 -5.6568 3.0616 0 -7.3912
  [4,16,3.4443,0,-8.3151,6.3639,0,-6.3639,5.6568,0,-5.6568,3.0616,0,-7.3912],
// 4 16 6.3639 0 -6.3639 8.3151 0 -3.4443 7.3912 0 -3.0616 5.6568 0 -5.6568
  [4,16,6.3639,0,-6.3639,8.3151,0,-3.4443,7.3912,0,-3.0616,5.6568,0,-5.6568],
// 4 16 8.3151 0 -3.4443 9 0 0 8 0 0 7.3912 0 -3.0616
  [4,16,8.3151,0,-3.4443,9,0,0,8,0,0,7.3912,0,-3.0616],
];
module ldraw_lib__4_4ring8(step=0, col=false, unit=2/5, alt=false, line=0.2, solid=!$preview)
    makepoly(ldraw_lib__4_4ring8(), step=step, col=col, unit=unit, alt=alt, line=line, solid=solid);
ldraw_lib__4_4ring8(line=0.2);
// file: ../p/4-4cylo.scad
use <../lib.scad>
use <4-4cyli.scad>
use <4-4edge.scad>
function ldraw_lib__4_4cylo() = [
// 0 Cylinder Open 1.0
// 0 Name: 4-4cylo.dat
// 0 Author: Mark Kennedy [mkennedy]
// 0 !LDRAW_ORG Primitive UPDATE 2010-01
// 0 !LICENSE Licensed under CC BY 2.0 and CC BY 4.0 : see CAreadme.txt
// 
// 0 BFC CERTIFY CCW
  [0,"BFC","CERTIFY"],
  [0,"BFC","CCW"],
// 
// 0 !HISTORY 2010-04-05 [PTadmin] Official Update 2010-01
// 
// 
// 1 16 0 0 0 1 0 0 0 1 0 0 0 1 4-4edge.dat
  [1,16,0,0,0,1,0,0,0,1,0,0,0,1, ldraw_lib__4_4edge()],
// 1 16 0 1 0 1 0 0 0 1 0 0 0 1 4-4edge.dat
  [1,16,0,1,0,1,0,0,0,1,0,0,0,1, ldraw_lib__4_4edge()],
// 1 16 0 0 0 1 0 0 0 1 0 0 0 1 4-4cyli.dat
  [1,16,0,0,0,1,0,0,0,1,0,0,0,1, ldraw_lib__4_4cyli()],
// 0
];
makepoly(ldraw_lib__4_4cylo(), line=0.2);
// file: ../p/1-16chrd.scad
use <../lib.scad>
use <empty.scad>
$fa=1; $fs=0.2;
function ldraw_lib__1_16chrd(realsolid=false) = [
// 0 Chord 0.0625
// 0 Name: 1-16chrd.dat
// 0 Author: Philippe Hurbain [Philo]
// 0 !LDRAW_ORG Primitive UPDATE 2015-01
// 0 !LICENSE Licensed under CC BY 2.0 and CC BY 4.0 : see CAreadme.txt
// 
// 0 BFC CERTIFY CCW
  [0,"BFC","CERTIFY"],
  [0,"BFC","CCW"],
// 
// 0 !HISTORY 2015-10-11 [PTadmin] Official Update 2015-01
// 
// 
// 0 // This file is intentionally empty because at the current \P resolution,
// 0 // an 1-16chrd is actually empty. However, this file still is present
// 0 // to allow tools to do primitives substition and fill in a real chrd here,
// 0 // or, if desired, to substitute this with the hi-res 48\1-16chrd.
// 
// 0 // This file is based on an idea by Darats at http://forums.ldraw.org/read.php?19,14500,14500#msg-14500
// 
// 1 16 0 0 0 1 0 0 0 1 0 0 0 1 empty.dat
  [1,16,0,0,0,1,0,0,0,1,0,0,0,1, ldraw_lib__empty(realsolid)],
];
module ldraw_lib__1_16chrd(step=0, col=false, unit=2/5, alt=false, line=0.2, solid=!$preview)
    makepoly(ldraw_lib__1_16chrd(solid), step=step, col=col, unit=unit, alt=alt, line=line, solid=solid);
ldraw_lib__1_16chrd(line=0.2);
// file: s/98138s02.scad
use <../../lib.scad>
use <../../p/4-4cylo.scad>
use <../../p/4-4ring8.scad>
use <../../p/4-4ring9.scad>
use <../../p/stud4o.scad>
function ldraw_lib__s__98138s02() = [
// 0 ~Tile  1 x  1 Round with Groove without Complete Top Face
// 0 Name: s\98138s02.dat
// 0 Author: Magnus Forsberg [MagFors]
// 0 !LDRAW_ORG Subpart UPDATE 2020-01
// 0 !LICENSE Licensed under CC BY 2.0 and CC BY 4.0 : see CAreadme.txt
// 
// 0 BFC CERTIFY CCW
  [0,"BFC","CERTIFY"],
  [0,"BFC","CCW"],
// 
// 0 !HISTORY 2020-06-28 [PTadmin] Official Update 2020-01
// 
// 
// 1 16 0 4 0 1 0 0 0 -1 0 0 0 1 stud4o.dat
  [1,16,0,4,0,1,0,0,0,-1,0,0,0,1, ldraw_lib__stud4o()],
// 1 16 0 8 0 -1 0 0 0 -1 0 0 0 1 4-4ring8.dat
  [1,16,0,8,0,-1,0,0,0,-1,0,0,0,1, ldraw_lib__4_4ring8()],
// 1 16 0 7 0 9 0 0 0 1 0 0 0 9 4-4cylo.dat
  [1,16,0,7,0,9,0,0,0,1,0,0,0,9, ldraw_lib__4_4cylo()],
// 1 16 0 7 0 -1 0 0 0 -1 0 0 0 1 4-4ring9.dat
  [1,16,0,7,0,-1,0,0,0,-1,0,0,0,1, ldraw_lib__4_4ring9()],
// 1 16 0 0 0 10 0 0 0 7 0 0 0 10 4-4cylo.dat
  [1,16,0,0,0,10,0,0,0,7,0,0,0,10, ldraw_lib__4_4cylo()],
];
module ldraw_lib__s__98138s02(step=0, col=false, unit=2/5, alt=false, line=0.2, solid=!$preview)
    makepoly(ldraw_lib__s__98138s02(), step=step, col=col, unit=unit, alt=alt, line=line, solid=solid);
ldraw_lib__s__98138s02(line=0.2);
// file: ../p/48/5-48ndis.scad
use <../../lib.scad>
function ldraw_lib__48__5_48ndis() = [
// 0 Hi-Res Disc Negative 0.10417
// 0 Name: 48\5-48ndis.dat
// 0 Author: Alex Taylor [anathema]
// 0 !LDRAW_ORG 48_Primitive UPDATE 2009-03
// 0 !LICENSE Licensed under CC BY 2.0 and CC BY 4.0 : see CAreadme.txt
// 
// 0 BFC CERTIFY CCW
  [0,"BFC","CERTIFY"],
  [0,"BFC","CCW"],
// 
// 0 !HISTORY 2009-12-29 [PTadmin] Official Update 2009-03
// 
// 
// 3 16 1 0 1 0.9914 0 0.1305 1 0 0
  [3,16,1,0,1,0.9914,0,0.1305,1,0,0],
// 3 16 1 0 1 0.9659 0 0.2588 0.9914 0 0.1305
  [3,16,1,0,1,0.9659,0,0.2588,0.9914,0,0.1305],
// 3 16 1 0 1 0.9239 0 0.3827 0.9659 0 0.2588
  [3,16,1,0,1,0.9239,0,0.3827,0.9659,0,0.2588],
// 3 16 1 0 1 0.866 0 0.5 0.9239 0 0.3827
  [3,16,1,0,1,0.866,0,0.5,0.9239,0,0.3827],
// 3 16 1 0 1 0.7934 0 0.6088 0.866 0 0.5
  [3,16,1,0,1,0.7934,0,0.6088,0.866,0,0.5],
// 0
];
makepoly(ldraw_lib__48__5_48ndis(), line=0.2);
// file: ../p/48/5-48chrd.scad
use <../../lib.scad>
function ldraw_lib__48__5_48chrd() = [
// 0 Hi-Res Chord 0.1042
// 0 Name: 48\5-48chrd.dat
// 0 Author: Philippe Hurbain [Philo]
// 0 !LDRAW_ORG 48_Primitive UPDATE 2012-02
// 0 !LICENSE Licensed under CC BY 2.0 and CC BY 4.0 : see CAreadme.txt
// 
// 0 BFC CERTIFY CCW
  [0,"BFC","CERTIFY"],
  [0,"BFC","CCW"],
// 
// 0 !HISTORY 2012-08-09 [PTadmin] Official Update 2012-02
// 
// 
// 3 16 1 0 0 0.9914 0 0.1305 0.9659 0 0.2588
  [3,16,1,0,0,0.9914,0,0.1305,0.9659,0,0.2588],
// 3 16 1 0 0 0.9659 0 0.2588 0.9239 0 0.3827
  [3,16,1,0,0,0.9659,0,0.2588,0.9239,0,0.3827],
// 3 16 1 0 0 0.9239 0 0.3827 0.866 0 0.5
  [3,16,1,0,0,0.9239,0,0.3827,0.866,0,0.5],
// 3 16 1 0 0 0.866 0 0.5 0.7934 0 0.6088
  [3,16,1,0,0,0.866,0,0.5,0.7934,0,0.6088],
// 0 // Built by Primitive Generator 2
];
module ldraw_lib__48__5_48chrd(step=0, col=false, unit=2/5, alt=false, line=0.2, solid=!$preview)
    makepoly(ldraw_lib__48__5_48chrd(), step=step, col=col, unit=unit, alt=alt, line=line, solid=solid);
ldraw_lib__48__5_48chrd(line=0.2);
// file: ../p/4-4ering.scad
use <../lib.scad>
use <1-16chrd.scad>
function ldraw_lib__4_4ering() = [
// 0 Adapter Ring Triangles to Normal 1.0
// 0 Name: 4-4ering.dat
// 0 Author: Philippe Hurbain [Philo]
// 0 !LDRAW_ORG Primitive UPDATE 2015-01
// 0 !LICENSE Licensed under CC BY 2.0 and CC BY 4.0 : see CAreadme.txt
// 
// 0 BFC CERTIFY CCW
  [0,"BFC","CERTIFY"],
  [0,"BFC","CCW"],
// 
// 0 !HISTORY 2015-10-11 [PTadmin] Official Update 2015-01
// 
// 
// 0 // This file uses 1-16chrd (actually empty). It allows
// 0 // tools to do primitives substition and fill in a ring of chrd here,
// 0 // or, if desired, to substitute this with the hi-res 48\1-16chrd.
// 0 // This file is based on an idea by Darats at http://forums.ldraw.org/read.php?19,14500,14500#msg-14500
// 
// 1 16 0 0 0 1 0 0 0 1 0 0 0 1 1-16chrd.dat
  [1,16,0,0,0,1,0,0,0,1,0,0,0,1, ldraw_lib__1_16chrd()],
// 1 16 0 0 0 0.92388 0 0.38268 0 1 0 -0.38268 0 0.92388 1-16chrd.dat
  [1,16,0,0,0,0.92388,0,0.38268,0,1,0,-0.38268,0,0.92388, ldraw_lib__1_16chrd()],
// 1 16 0 0 0 0.70711 0 0.70711 0 1 0 -0.70711 0 0.70711 1-16chrd.dat
  [1,16,0,0,0,0.70711,0,0.70711,0,1,0,-0.70711,0,0.70711, ldraw_lib__1_16chrd()],
// 1 16 0 0 0 0.38268 0 0.92388 0 1 0 -0.92388 0 0.38268 1-16chrd.dat
  [1,16,0,0,0,0.38268,0,0.92388,0,1,0,-0.92388,0,0.38268, ldraw_lib__1_16chrd()],
// 1 16 0 0 0 0 0 1 0 1 0 -1 0 0 1-16chrd.dat
  [1,16,0,0,0,0,0,1,0,1,0,-1,0,0, ldraw_lib__1_16chrd()],
// 1 16 0 0 0 -0.38268 0 0.92388 0 1 0 -0.92388 0 -0.38268 1-16chrd.dat
  [1,16,0,0,0,-0.38268,0,0.92388,0,1,0,-0.92388,0,-0.38268, ldraw_lib__1_16chrd()],
// 1 16 0 0 0 -0.70711 0 0.70711 0 1 0 -0.70711 0 -0.70711 1-16chrd.dat
  [1,16,0,0,0,-0.70711,0,0.70711,0,1,0,-0.70711,0,-0.70711, ldraw_lib__1_16chrd()],
// 1 16 0 0 0 -0.92388 0 0.38268 0 1 0 -0.38268 0 -0.92388 1-16chrd.dat
  [1,16,0,0,0,-0.92388,0,0.38268,0,1,0,-0.38268,0,-0.92388, ldraw_lib__1_16chrd()],
// 1 16 0 0 0 0 0 -1 0 1 0 1 0 0 1-16chrd.dat
  [1,16,0,0,0,0,0,-1,0,1,0,1,0,0, ldraw_lib__1_16chrd()],
// 1 16 0 0 0 0.38268 0 -0.92388 0 1 0 0.92388 0 0.38268 1-16chrd.dat
  [1,16,0,0,0,0.38268,0,-0.92388,0,1,0,0.92388,0,0.38268, ldraw_lib__1_16chrd()],
// 1 16 0 0 0 0.70711 0 -0.70711 0 1 0 0.70711 0 0.70711 1-16chrd.dat
  [1,16,0,0,0,0.70711,0,-0.70711,0,1,0,0.70711,0,0.70711, ldraw_lib__1_16chrd()],
// 1 16 0 0 0 0.92388 0 -0.38268 0 1 0 0.38268 0 0.92388 1-16chrd.dat
  [1,16,0,0,0,0.92388,0,-0.38268,0,1,0,0.38268,0,0.92388, ldraw_lib__1_16chrd()],
// 1 16 0 0 0 -1 0 0 0 1 0 0 0 -1 1-16chrd.dat
  [1,16,0,0,0,-1,0,0,0,1,0,0,0,-1, ldraw_lib__1_16chrd()],
// 1 16 0 0 0 -0.92388 0 -0.38268 0 1 0 0.38268 0 -0.92388 1-16chrd.dat
  [1,16,0,0,0,-0.92388,0,-0.38268,0,1,0,0.38268,0,-0.92388, ldraw_lib__1_16chrd()],
// 1 16 0 0 0 -0.70711 0 -0.70711 0 1 0 0.70711 0 -0.70711 1-16chrd.dat
  [1,16,0,0,0,-0.70711,0,-0.70711,0,1,0,0.70711,0,-0.70711, ldraw_lib__1_16chrd()],
// 1 16 0 0 0 -0.38268 0 -0.92388 0 1 0 0.92388 0 -0.38268 1-16chrd.dat
  [1,16,0,0,0,-0.38268,0,-0.92388,0,1,0,0.92388,0,-0.38268, ldraw_lib__1_16chrd()],
];
makepoly(ldraw_lib__4_4ering(), line=0.2);
// file: ../p/1-8chrd.scad
use <../lib.scad>
$fa=1; $fs=0.2;
function ldraw_lib__1_8chrd(realsolid=false) = [
// 0 Chord 0.125
// 0 Name: 1-8chrd.dat
// 0 Author: Andy Westrate [westrate]
// 0 !LDRAW_ORG Primitive UPDATE 2004-02
// 0 !LICENSE Licensed under CC BY 2.0 and CC BY 4.0 : see CAreadme.txt
// 
// 0 BFC CERTIFY CCW
  [0,"BFC","CERTIFY"],
  [0,"BFC","CCW"],
// 
// 0 !HISTORY 2004-04-22 [PTadmin] Official Update 2004-02
// 0 !HISTORY 2007-06-22 [PTadmin] Header formatted for Contributor Agreement
// 0 !HISTORY 2008-07-01 [PTadmin] Official Update 2008-01
// 
// 
// 3 16 0.7071 0 0.7071 1 0 0 0.9239 0 0.3827
  [3,16,0.7071,0,0.7071,1,0,0,0.9239,0,0.3827],
// 
// 0
];
module ldraw_lib__1_8chrd(step=0, col=false, unit=2/5, alt=false, line=0.2, solid=!$preview)
    makepoly(ldraw_lib__1_8chrd(solid), step=step, col=col, unit=unit, alt=alt, line=line, solid=solid);
ldraw_lib__1_8chrd(line=0.2);
// file: ../p/1-4tang.scad
use <../lib.scad>
function ldraw_lib__1_4tang() = [
// 0 Disc Negative Tangent 0.25
// 0 Name: 1-4tang.dat
// 0 Author: Andy Westrate [westrate]
// 0 !LDRAW_ORG Primitive UPDATE 2011-02
// 0 !LICENSE Licensed under CC BY 2.0 and CC BY 4.0 : see CAreadme.txt
// 
// 0 BFC CERTIFY CCW
  [0,"BFC","CERTIFY"],
  [0,"BFC","CCW"],
// 
// 0 !HISTORY 2011-12-29 [PTadmin] Official Update 2011-02
// 
// 
// 3 16 1 0 0 1 0 0.1989 0.9239 0 0.3827
  [3,16,1,0,0,1,0,0.1989,0.9239,0,0.3827],
// 3 16 0.9239 0 0.3827 0.8478 0 0.5665 0.7071 0 0.7071
  [3,16,0.9239,0,0.3827,0.8478,0,0.5665,0.7071,0,0.7071],
// 3 16 0.7071 0 0.7071 0.5665 0 0.8478 0.3827 0 0.9239
  [3,16,0.7071,0,0.7071,0.5665,0,0.8478,0.3827,0,0.9239],
// 3 16 0.3827 0 0.9239 0.1989 0 1 0 0 1
  [3,16,0.3827,0,0.9239,0.1989,0,1,0,0,1],
// 0 // end
];
makepoly(ldraw_lib__1_4tang(), line=0.2);
// file: ../p/1-4ndis.scad
use <../lib.scad>
function ldraw_lib__1_4ndis() = [
// 0 Disc Negative 0.25
// 0 Name: 1-4ndis.dat
// 0 Author: James Jessiman
// 0 !LDRAW_ORG Primitive UPDATE 2012-01
// 0 !LICENSE Licensed under CC BY 2.0 and CC BY 4.0 : see CAreadme.txt
// 
// 0 BFC CERTIFY CCW
  [0,"BFC","CERTIFY"],
  [0,"BFC","CCW"],
// 
// 0 !HISTORY 2002-03-23 [sbliss] Added BFC Statement
// 0 !HISTORY 2002-04-25 [PTadmin] Official Update 2002-02
// 0 !HISTORY 2007-06-22 [PTadmin] Header formatted for Contributor Agreement
// 0 !HISTORY 2008-07-01 [PTadmin] Official Update 2008-01
// 0 !HISTORY 2012-02-16 [Philo] Changed to CCW
// 0 !HISTORY 2012-03-30 [PTadmin] Official Update 2012-01
// 
// 
// 3 16 0.9239 0 0.3827 1 0 0 1 0 1
  [3,16,0.9239,0,0.3827,1,0,0,1,0,1],
// 3 16 0.7071 0 0.7071 0.9239 0 0.3827 1 0 1
  [3,16,0.7071,0,0.7071,0.9239,0,0.3827,1,0,1],
// 3 16 0.3827 0 0.9239 0.7071 0 0.7071 1 0 1
  [3,16,0.3827,0,0.9239,0.7071,0,0.7071,1,0,1],
// 3 16 0 0 1 0.3827 0 0.9239 1 0 1
  [3,16,0,0,1,0.3827,0,0.9239,1,0,1],
];
module ldraw_lib__1_4ndis(step=0, col=false, unit=2/5, alt=false, line=0.2, solid=!$preview)
    makepoly(ldraw_lib__1_4ndis(), step=step, col=col, unit=unit, alt=alt, line=line, solid=solid);
ldraw_lib__1_4ndis(line=0.2);
// main file
use <../lib.scad>
use <../p/1-4ndis.scad>
use <../p/1-4tang.scad>
use <../p/1-8chrd.scad>
use <../p/4-4ering.scad>
use <../p/48/5-48chrd.scad>
use <../p/48/5-48ndis.scad>
use <s/98138s02.scad>
function ldraw_lib__98138pz4() = [
// 0 Tile  1 x  1 Round with Two White Squares on Black Disc Pattern
// 0 Name: 98138pz4.dat
// 0 Author: Vincent Messenet [Cheenzo]
// 0 !LDRAW_ORG Part UPDATE 2024-06
// 0 !LICENSE Licensed under CC BY 4.0 : see CAreadme.txt
// 
// 0 BFC CERTIFY CCW
  [0,"BFC","CERTIFY"],
  [0,"BFC","CCW"],
// 
// 0 !KEYWORDS Avatar, Brickheadz, BrickLink 98138pb355, Eye, Na'vi
// 0 !KEYWORDS Rebrickable 98138pr0338, Set 40554
// 
// 0 !HISTORY 2024-07-29 [OrionP] Official Update 2024-06
// 
// 1 16 0 0 0 1 0 0 0 1 0 0 0 1 s\98138s02.dat
  [1,16,0,0,0,1,0,0,0,1,0,0,0,1, ldraw_lib__s__98138s02()],
// 1 16 0 0 0 10 0 0 0 1 0 0 0 10 4-4ering.dat
  [1,16,0,0,0,10,0,0,0,1,0,0,0,10, ldraw_lib__4_4ering()],
// 1 16 0 0 0 -4.5 0 0 0 1 0 0 0 4.5 48\5-48ndis.dat
  [1,16,0,0,0,-4.5,0,0,0,1,0,0,0,4.5, ldraw_lib__48__5_48ndis()],
// 1 16 0 0 0 4.5 0 0 0 1 0 0 0 4.5 48\5-48ndis.dat
  [1,16,0,0,0,4.5,0,0,0,1,0,0,0,4.5, ldraw_lib__48__5_48ndis()],
// 1 16 0 0 0 0 0 4.5 0 1 0 -4.5 0 0 1-4tang.dat
  [1,16,0,0,0,0,0,4.5,0,1,0,-4.5,0,0, ldraw_lib__1_4tang()],
// 1 16 0 0 0 0 0 -4.5 0 1 0 -4.5 0 0 1-4ndis.dat
  [1,16,0,0,0,0,0,-4.5,0,1,0,-4.5,0,0, ldraw_lib__1_4ndis()],
// 1 0 0 0 0 -4.5 0 0 0 1 0 0 0 -4.5 1-8chrd.dat
  [1,0,0,0,0,-4.5,0,0,0,1,0,0,0,-4.5, ldraw_lib__1_8chrd()],
// 1 0 0 0 0 4.5 0 0 0 1 0 0 0 -4.5 1-8chrd.dat
  [1,0,0,0,0,4.5,0,0,0,1,0,0,0,-4.5, ldraw_lib__1_8chrd()],
// 1 0 0 0 0 -4.5 0 0 0 1 0 0 0 4.5 48\5-48chrd.dat
  [1,0,0,0,0,-4.5,0,0,0,1,0,0,0,4.5, ldraw_lib__48__5_48chrd()],
// 1 0 0 0 0 4.5 0 0 0 1 0 0 0 4.5 48\5-48chrd.dat
  [1,0,0,0,0,4.5,0,0,0,1,0,0,0,4.5, ldraw_lib__48__5_48chrd()],
// 1 0 0 0 0 0 0 4.5 0 1 0 -4.5 0 0 1-8chrd.dat
  [1,0,0,0,0,0,0,4.5,0,1,0,-4.5,0,0, ldraw_lib__1_8chrd()],
// 1 0 0 0 0 0 0 -4.5 0 1 0 -4.5 0 0 1-8chrd.dat
  [1,0,0,0,0,0,0,-4.5,0,1,0,-4.5,0,0, ldraw_lib__1_8chrd()],
// 3 0 -3.5703 0 -1 -3.5703 0 2.7396 -4.5 0 0
  [3,0,-3.5703,0,-1,-3.5703,0,2.7396,-4.5,0,0],
// 3 0 -3.18195 0 -3.18195 -3.5703 0 -1 -4.5 0 0
  [3,0,-3.18195,0,-3.18195,-3.5703,0,-1,-4.5,0,0],
// 3 0 4.5 0 0 3.5703 0 2.7396 3.5703 0 -1
  [3,0,4.5,0,0,3.5703,0,2.7396,3.5703,0,-1],
// 3 0 4.5 0 0 3.5703 0 -1 3.18195 0 -3.18195
  [3,0,4.5,0,0,3.5703,0,-1,3.18195,0,-3.18195],
// 4 0 3.5703 0 -1 -3.5703 0 -1 -3.18195 0 -3.18195 3.18195 0 -3.18195
  [4,0,3.5703,0,-1,-3.5703,0,-1,-3.18195,0,-3.18195,3.18195,0,-3.18195],
// 3 0 3.18195 0 -3.18195 -3.18195 0 -3.18195 0 0 -4.5
  [3,0,3.18195,0,-3.18195,-3.18195,0,-3.18195,0,0,-4.5],
// 4 15 -3.5703 0 6.1406 -3.5703 0 2.7396 3.5703 0 2.7396 3.5703 0 6.1406
  [4,15,-3.5703,0,6.1406,-3.5703,0,2.7396,3.5703,0,2.7396,3.5703,0,6.1406],
// 4 15 3.5703 0 -1 3.5703 0 2.7396 -3.5703 0 2.7396 -3.5703 0 -1
  [4,15,3.5703,0,-1,3.5703,0,2.7396,-3.5703,0,2.7396,-3.5703,0,-1],
// 4 15 4 0 -2.5 4 0 -5.5 7 0 -5.5 7 0 -2.5
  [4,15,4,0,-2.5,4,0,-5.5,7,0,-5.5,7,0,-2.5],
// 4 16 7 0 -5.5 4 0 -5.5 3.827 0 -9.239 7.071 0 -7.071
  [4,16,7,0,-5.5,4,0,-5.5,3.827,0,-9.239,7.071,0,-7.071],
// 4 16 7 0 -5.5 7.071 0 -7.071 9.239 0 -3.827 7 0 -2.5
  [4,16,7,0,-5.5,7.071,0,-7.071,9.239,0,-3.827,7,0,-2.5],
// 4 16 -9.239 0 3.827 -10 0 0 -4.5 0 0 -4.5 0 4.5
  [4,16,-9.239,0,3.827,-10,0,0,-4.5,0,0,-4.5,0,4.5],
// 3 16 -4.5 0 0 -10 0 0 -9.239 0 -3.827
  [3,16,-4.5,0,0,-10,0,0,-9.239,0,-3.827],
// 4 16 -7.071 0 -7.071 -4.5 0 -4.5 -4.5 0 0 -9.239 0 -3.827
  [4,16,-7.071,0,-7.071,-4.5,0,-4.5,-4.5,0,0,-9.239,0,-3.827],
// 4 16 -7.071 0 -7.071 -3.827 0 -9.239 0 0 -10 -4.5 0 -4.5
  [4,16,-7.071,0,-7.071,-3.827,0,-9.239,0,0,-10,-4.5,0,-4.5],
// 4 16 3.827 0 -9.239 0 0 -4.5 -4.5 0 -4.5 0 0 -10
  [4,16,3.827,0,-9.239,0,0,-4.5,-4.5,0,-4.5,0,0,-10],
// 4 16 0 0 -4.5 3.827 0 -9.239 4 0 -5.5 .89505 0 -4.5
  [4,16,0,0,-4.5,3.827,0,-9.239,4,0,-5.5,.89505,0,-4.5],
// 3 16 1.72215 0 -4.15755 .89505 0 -4.5 4 0 -5.5
  [3,16,1.72215,0,-4.15755,.89505,0,-4.5,4,0,-5.5],
// 3 16 2.54925 0 -3.8151 1.72215 0 -4.15755 4 0 -5.5
  [3,16,2.54925,0,-3.8151,1.72215,0,-4.15755,4,0,-5.5],
// 4 16 2.54925 0 -3.8151 4 0 -5.5 4 0 -2.5 3.18195 0 -3.18195
  [4,16,2.54925,0,-3.8151,4,0,-5.5,4,0,-2.5,3.18195,0,-3.18195],
// 4 16 4 0 -2.5 7 0 -2.5 4.5 0 -.89505 4.15755 0 -1.72215
  [4,16,4,0,-2.5,7,0,-2.5,4.5,0,-.89505,4.15755,0,-1.72215],
// 3 16 4.5 0 0 4.5 0 -.89505 7 0 -2.5
  [3,16,4.5,0,0,4.5,0,-.89505,7,0,-2.5],
// 4 16 9.239 0 -3.827 10 0 0 4.5 0 0 7 0 -2.5
  [4,16,9.239,0,-3.827,10,0,0,4.5,0,0,7,0,-2.5],
// 4 16 4.5 0 4.5 4.5 0 0 10 0 0 9.239 0 3.827
  [4,16,4.5,0,4.5,4.5,0,0,10,0,0,9.239,0,3.827],
// 4 16 7.071 0 7.071 3.5703 0 6.1406 4.5 0 4.5 9.239 0 3.827
  [4,16,7.071,0,7.071,3.5703,0,6.1406,4.5,0,4.5,9.239,0,3.827],
// 4 16 7.071 0 7.071 3.827 0 9.239 0 0 10 3.5703 0 6.1406
  [4,16,7.071,0,7.071,3.827,0,9.239,0,0,10,3.5703,0,6.1406],
// 3 16 0 0 10 -3.5703 0 6.1406 3.5703 0 6.1406
  [3,16,0,0,10,-3.5703,0,6.1406,3.5703,0,6.1406],
// 4 16 -3.5703 0 6.1406 0 0 10 -3.827 0 9.239 -7.071 0 7.071
  [4,16,-3.5703,0,6.1406,0,0,10,-3.827,0,9.239,-7.071,0,7.071],
// 4 16 -3.5703 0 6.1406 -7.071 0 7.071 -9.239 0 3.827 -4.5 0 4.5
  [4,16,-3.5703,0,6.1406,-7.071,0,7.071,-9.239,0,3.827,-4.5,0,4.5],
// 3 16 4 0 -2.5 3.8151 0 -2.54925 3.18195 0 -3.18195
  [3,16,4,0,-2.5,3.8151,0,-2.54925,3.18195,0,-3.18195],
// 3 16 3.8151 0 -2.54925 4 0 -2.5 4.15755 0 -1.72215
  [3,16,3.8151,0,-2.54925,4,0,-2.5,4.15755,0,-1.72215],
// 3 16 -3.5703 0 6.1406 -4.5 0 4.5 -3.5703 0 2.7396
  [3,16,-3.5703,0,6.1406,-4.5,0,4.5,-3.5703,0,2.7396],
// 3 16 4.5 0 4.5 3.5703 0 6.1406 3.5703 0 2.7396
  [3,16,4.5,0,4.5,3.5703,0,6.1406,3.5703,0,2.7396],
];
module ldraw_lib__98138pz4(step=0, col=false, unit=2/5, alt=false, line=0.2, solid=!$preview)
    makepoly(ldraw_lib__98138pz4(), step=step, col=col, unit=unit, alt=alt, line=line, solid=solid);
ldraw_lib__98138pz4(line=0.2);
